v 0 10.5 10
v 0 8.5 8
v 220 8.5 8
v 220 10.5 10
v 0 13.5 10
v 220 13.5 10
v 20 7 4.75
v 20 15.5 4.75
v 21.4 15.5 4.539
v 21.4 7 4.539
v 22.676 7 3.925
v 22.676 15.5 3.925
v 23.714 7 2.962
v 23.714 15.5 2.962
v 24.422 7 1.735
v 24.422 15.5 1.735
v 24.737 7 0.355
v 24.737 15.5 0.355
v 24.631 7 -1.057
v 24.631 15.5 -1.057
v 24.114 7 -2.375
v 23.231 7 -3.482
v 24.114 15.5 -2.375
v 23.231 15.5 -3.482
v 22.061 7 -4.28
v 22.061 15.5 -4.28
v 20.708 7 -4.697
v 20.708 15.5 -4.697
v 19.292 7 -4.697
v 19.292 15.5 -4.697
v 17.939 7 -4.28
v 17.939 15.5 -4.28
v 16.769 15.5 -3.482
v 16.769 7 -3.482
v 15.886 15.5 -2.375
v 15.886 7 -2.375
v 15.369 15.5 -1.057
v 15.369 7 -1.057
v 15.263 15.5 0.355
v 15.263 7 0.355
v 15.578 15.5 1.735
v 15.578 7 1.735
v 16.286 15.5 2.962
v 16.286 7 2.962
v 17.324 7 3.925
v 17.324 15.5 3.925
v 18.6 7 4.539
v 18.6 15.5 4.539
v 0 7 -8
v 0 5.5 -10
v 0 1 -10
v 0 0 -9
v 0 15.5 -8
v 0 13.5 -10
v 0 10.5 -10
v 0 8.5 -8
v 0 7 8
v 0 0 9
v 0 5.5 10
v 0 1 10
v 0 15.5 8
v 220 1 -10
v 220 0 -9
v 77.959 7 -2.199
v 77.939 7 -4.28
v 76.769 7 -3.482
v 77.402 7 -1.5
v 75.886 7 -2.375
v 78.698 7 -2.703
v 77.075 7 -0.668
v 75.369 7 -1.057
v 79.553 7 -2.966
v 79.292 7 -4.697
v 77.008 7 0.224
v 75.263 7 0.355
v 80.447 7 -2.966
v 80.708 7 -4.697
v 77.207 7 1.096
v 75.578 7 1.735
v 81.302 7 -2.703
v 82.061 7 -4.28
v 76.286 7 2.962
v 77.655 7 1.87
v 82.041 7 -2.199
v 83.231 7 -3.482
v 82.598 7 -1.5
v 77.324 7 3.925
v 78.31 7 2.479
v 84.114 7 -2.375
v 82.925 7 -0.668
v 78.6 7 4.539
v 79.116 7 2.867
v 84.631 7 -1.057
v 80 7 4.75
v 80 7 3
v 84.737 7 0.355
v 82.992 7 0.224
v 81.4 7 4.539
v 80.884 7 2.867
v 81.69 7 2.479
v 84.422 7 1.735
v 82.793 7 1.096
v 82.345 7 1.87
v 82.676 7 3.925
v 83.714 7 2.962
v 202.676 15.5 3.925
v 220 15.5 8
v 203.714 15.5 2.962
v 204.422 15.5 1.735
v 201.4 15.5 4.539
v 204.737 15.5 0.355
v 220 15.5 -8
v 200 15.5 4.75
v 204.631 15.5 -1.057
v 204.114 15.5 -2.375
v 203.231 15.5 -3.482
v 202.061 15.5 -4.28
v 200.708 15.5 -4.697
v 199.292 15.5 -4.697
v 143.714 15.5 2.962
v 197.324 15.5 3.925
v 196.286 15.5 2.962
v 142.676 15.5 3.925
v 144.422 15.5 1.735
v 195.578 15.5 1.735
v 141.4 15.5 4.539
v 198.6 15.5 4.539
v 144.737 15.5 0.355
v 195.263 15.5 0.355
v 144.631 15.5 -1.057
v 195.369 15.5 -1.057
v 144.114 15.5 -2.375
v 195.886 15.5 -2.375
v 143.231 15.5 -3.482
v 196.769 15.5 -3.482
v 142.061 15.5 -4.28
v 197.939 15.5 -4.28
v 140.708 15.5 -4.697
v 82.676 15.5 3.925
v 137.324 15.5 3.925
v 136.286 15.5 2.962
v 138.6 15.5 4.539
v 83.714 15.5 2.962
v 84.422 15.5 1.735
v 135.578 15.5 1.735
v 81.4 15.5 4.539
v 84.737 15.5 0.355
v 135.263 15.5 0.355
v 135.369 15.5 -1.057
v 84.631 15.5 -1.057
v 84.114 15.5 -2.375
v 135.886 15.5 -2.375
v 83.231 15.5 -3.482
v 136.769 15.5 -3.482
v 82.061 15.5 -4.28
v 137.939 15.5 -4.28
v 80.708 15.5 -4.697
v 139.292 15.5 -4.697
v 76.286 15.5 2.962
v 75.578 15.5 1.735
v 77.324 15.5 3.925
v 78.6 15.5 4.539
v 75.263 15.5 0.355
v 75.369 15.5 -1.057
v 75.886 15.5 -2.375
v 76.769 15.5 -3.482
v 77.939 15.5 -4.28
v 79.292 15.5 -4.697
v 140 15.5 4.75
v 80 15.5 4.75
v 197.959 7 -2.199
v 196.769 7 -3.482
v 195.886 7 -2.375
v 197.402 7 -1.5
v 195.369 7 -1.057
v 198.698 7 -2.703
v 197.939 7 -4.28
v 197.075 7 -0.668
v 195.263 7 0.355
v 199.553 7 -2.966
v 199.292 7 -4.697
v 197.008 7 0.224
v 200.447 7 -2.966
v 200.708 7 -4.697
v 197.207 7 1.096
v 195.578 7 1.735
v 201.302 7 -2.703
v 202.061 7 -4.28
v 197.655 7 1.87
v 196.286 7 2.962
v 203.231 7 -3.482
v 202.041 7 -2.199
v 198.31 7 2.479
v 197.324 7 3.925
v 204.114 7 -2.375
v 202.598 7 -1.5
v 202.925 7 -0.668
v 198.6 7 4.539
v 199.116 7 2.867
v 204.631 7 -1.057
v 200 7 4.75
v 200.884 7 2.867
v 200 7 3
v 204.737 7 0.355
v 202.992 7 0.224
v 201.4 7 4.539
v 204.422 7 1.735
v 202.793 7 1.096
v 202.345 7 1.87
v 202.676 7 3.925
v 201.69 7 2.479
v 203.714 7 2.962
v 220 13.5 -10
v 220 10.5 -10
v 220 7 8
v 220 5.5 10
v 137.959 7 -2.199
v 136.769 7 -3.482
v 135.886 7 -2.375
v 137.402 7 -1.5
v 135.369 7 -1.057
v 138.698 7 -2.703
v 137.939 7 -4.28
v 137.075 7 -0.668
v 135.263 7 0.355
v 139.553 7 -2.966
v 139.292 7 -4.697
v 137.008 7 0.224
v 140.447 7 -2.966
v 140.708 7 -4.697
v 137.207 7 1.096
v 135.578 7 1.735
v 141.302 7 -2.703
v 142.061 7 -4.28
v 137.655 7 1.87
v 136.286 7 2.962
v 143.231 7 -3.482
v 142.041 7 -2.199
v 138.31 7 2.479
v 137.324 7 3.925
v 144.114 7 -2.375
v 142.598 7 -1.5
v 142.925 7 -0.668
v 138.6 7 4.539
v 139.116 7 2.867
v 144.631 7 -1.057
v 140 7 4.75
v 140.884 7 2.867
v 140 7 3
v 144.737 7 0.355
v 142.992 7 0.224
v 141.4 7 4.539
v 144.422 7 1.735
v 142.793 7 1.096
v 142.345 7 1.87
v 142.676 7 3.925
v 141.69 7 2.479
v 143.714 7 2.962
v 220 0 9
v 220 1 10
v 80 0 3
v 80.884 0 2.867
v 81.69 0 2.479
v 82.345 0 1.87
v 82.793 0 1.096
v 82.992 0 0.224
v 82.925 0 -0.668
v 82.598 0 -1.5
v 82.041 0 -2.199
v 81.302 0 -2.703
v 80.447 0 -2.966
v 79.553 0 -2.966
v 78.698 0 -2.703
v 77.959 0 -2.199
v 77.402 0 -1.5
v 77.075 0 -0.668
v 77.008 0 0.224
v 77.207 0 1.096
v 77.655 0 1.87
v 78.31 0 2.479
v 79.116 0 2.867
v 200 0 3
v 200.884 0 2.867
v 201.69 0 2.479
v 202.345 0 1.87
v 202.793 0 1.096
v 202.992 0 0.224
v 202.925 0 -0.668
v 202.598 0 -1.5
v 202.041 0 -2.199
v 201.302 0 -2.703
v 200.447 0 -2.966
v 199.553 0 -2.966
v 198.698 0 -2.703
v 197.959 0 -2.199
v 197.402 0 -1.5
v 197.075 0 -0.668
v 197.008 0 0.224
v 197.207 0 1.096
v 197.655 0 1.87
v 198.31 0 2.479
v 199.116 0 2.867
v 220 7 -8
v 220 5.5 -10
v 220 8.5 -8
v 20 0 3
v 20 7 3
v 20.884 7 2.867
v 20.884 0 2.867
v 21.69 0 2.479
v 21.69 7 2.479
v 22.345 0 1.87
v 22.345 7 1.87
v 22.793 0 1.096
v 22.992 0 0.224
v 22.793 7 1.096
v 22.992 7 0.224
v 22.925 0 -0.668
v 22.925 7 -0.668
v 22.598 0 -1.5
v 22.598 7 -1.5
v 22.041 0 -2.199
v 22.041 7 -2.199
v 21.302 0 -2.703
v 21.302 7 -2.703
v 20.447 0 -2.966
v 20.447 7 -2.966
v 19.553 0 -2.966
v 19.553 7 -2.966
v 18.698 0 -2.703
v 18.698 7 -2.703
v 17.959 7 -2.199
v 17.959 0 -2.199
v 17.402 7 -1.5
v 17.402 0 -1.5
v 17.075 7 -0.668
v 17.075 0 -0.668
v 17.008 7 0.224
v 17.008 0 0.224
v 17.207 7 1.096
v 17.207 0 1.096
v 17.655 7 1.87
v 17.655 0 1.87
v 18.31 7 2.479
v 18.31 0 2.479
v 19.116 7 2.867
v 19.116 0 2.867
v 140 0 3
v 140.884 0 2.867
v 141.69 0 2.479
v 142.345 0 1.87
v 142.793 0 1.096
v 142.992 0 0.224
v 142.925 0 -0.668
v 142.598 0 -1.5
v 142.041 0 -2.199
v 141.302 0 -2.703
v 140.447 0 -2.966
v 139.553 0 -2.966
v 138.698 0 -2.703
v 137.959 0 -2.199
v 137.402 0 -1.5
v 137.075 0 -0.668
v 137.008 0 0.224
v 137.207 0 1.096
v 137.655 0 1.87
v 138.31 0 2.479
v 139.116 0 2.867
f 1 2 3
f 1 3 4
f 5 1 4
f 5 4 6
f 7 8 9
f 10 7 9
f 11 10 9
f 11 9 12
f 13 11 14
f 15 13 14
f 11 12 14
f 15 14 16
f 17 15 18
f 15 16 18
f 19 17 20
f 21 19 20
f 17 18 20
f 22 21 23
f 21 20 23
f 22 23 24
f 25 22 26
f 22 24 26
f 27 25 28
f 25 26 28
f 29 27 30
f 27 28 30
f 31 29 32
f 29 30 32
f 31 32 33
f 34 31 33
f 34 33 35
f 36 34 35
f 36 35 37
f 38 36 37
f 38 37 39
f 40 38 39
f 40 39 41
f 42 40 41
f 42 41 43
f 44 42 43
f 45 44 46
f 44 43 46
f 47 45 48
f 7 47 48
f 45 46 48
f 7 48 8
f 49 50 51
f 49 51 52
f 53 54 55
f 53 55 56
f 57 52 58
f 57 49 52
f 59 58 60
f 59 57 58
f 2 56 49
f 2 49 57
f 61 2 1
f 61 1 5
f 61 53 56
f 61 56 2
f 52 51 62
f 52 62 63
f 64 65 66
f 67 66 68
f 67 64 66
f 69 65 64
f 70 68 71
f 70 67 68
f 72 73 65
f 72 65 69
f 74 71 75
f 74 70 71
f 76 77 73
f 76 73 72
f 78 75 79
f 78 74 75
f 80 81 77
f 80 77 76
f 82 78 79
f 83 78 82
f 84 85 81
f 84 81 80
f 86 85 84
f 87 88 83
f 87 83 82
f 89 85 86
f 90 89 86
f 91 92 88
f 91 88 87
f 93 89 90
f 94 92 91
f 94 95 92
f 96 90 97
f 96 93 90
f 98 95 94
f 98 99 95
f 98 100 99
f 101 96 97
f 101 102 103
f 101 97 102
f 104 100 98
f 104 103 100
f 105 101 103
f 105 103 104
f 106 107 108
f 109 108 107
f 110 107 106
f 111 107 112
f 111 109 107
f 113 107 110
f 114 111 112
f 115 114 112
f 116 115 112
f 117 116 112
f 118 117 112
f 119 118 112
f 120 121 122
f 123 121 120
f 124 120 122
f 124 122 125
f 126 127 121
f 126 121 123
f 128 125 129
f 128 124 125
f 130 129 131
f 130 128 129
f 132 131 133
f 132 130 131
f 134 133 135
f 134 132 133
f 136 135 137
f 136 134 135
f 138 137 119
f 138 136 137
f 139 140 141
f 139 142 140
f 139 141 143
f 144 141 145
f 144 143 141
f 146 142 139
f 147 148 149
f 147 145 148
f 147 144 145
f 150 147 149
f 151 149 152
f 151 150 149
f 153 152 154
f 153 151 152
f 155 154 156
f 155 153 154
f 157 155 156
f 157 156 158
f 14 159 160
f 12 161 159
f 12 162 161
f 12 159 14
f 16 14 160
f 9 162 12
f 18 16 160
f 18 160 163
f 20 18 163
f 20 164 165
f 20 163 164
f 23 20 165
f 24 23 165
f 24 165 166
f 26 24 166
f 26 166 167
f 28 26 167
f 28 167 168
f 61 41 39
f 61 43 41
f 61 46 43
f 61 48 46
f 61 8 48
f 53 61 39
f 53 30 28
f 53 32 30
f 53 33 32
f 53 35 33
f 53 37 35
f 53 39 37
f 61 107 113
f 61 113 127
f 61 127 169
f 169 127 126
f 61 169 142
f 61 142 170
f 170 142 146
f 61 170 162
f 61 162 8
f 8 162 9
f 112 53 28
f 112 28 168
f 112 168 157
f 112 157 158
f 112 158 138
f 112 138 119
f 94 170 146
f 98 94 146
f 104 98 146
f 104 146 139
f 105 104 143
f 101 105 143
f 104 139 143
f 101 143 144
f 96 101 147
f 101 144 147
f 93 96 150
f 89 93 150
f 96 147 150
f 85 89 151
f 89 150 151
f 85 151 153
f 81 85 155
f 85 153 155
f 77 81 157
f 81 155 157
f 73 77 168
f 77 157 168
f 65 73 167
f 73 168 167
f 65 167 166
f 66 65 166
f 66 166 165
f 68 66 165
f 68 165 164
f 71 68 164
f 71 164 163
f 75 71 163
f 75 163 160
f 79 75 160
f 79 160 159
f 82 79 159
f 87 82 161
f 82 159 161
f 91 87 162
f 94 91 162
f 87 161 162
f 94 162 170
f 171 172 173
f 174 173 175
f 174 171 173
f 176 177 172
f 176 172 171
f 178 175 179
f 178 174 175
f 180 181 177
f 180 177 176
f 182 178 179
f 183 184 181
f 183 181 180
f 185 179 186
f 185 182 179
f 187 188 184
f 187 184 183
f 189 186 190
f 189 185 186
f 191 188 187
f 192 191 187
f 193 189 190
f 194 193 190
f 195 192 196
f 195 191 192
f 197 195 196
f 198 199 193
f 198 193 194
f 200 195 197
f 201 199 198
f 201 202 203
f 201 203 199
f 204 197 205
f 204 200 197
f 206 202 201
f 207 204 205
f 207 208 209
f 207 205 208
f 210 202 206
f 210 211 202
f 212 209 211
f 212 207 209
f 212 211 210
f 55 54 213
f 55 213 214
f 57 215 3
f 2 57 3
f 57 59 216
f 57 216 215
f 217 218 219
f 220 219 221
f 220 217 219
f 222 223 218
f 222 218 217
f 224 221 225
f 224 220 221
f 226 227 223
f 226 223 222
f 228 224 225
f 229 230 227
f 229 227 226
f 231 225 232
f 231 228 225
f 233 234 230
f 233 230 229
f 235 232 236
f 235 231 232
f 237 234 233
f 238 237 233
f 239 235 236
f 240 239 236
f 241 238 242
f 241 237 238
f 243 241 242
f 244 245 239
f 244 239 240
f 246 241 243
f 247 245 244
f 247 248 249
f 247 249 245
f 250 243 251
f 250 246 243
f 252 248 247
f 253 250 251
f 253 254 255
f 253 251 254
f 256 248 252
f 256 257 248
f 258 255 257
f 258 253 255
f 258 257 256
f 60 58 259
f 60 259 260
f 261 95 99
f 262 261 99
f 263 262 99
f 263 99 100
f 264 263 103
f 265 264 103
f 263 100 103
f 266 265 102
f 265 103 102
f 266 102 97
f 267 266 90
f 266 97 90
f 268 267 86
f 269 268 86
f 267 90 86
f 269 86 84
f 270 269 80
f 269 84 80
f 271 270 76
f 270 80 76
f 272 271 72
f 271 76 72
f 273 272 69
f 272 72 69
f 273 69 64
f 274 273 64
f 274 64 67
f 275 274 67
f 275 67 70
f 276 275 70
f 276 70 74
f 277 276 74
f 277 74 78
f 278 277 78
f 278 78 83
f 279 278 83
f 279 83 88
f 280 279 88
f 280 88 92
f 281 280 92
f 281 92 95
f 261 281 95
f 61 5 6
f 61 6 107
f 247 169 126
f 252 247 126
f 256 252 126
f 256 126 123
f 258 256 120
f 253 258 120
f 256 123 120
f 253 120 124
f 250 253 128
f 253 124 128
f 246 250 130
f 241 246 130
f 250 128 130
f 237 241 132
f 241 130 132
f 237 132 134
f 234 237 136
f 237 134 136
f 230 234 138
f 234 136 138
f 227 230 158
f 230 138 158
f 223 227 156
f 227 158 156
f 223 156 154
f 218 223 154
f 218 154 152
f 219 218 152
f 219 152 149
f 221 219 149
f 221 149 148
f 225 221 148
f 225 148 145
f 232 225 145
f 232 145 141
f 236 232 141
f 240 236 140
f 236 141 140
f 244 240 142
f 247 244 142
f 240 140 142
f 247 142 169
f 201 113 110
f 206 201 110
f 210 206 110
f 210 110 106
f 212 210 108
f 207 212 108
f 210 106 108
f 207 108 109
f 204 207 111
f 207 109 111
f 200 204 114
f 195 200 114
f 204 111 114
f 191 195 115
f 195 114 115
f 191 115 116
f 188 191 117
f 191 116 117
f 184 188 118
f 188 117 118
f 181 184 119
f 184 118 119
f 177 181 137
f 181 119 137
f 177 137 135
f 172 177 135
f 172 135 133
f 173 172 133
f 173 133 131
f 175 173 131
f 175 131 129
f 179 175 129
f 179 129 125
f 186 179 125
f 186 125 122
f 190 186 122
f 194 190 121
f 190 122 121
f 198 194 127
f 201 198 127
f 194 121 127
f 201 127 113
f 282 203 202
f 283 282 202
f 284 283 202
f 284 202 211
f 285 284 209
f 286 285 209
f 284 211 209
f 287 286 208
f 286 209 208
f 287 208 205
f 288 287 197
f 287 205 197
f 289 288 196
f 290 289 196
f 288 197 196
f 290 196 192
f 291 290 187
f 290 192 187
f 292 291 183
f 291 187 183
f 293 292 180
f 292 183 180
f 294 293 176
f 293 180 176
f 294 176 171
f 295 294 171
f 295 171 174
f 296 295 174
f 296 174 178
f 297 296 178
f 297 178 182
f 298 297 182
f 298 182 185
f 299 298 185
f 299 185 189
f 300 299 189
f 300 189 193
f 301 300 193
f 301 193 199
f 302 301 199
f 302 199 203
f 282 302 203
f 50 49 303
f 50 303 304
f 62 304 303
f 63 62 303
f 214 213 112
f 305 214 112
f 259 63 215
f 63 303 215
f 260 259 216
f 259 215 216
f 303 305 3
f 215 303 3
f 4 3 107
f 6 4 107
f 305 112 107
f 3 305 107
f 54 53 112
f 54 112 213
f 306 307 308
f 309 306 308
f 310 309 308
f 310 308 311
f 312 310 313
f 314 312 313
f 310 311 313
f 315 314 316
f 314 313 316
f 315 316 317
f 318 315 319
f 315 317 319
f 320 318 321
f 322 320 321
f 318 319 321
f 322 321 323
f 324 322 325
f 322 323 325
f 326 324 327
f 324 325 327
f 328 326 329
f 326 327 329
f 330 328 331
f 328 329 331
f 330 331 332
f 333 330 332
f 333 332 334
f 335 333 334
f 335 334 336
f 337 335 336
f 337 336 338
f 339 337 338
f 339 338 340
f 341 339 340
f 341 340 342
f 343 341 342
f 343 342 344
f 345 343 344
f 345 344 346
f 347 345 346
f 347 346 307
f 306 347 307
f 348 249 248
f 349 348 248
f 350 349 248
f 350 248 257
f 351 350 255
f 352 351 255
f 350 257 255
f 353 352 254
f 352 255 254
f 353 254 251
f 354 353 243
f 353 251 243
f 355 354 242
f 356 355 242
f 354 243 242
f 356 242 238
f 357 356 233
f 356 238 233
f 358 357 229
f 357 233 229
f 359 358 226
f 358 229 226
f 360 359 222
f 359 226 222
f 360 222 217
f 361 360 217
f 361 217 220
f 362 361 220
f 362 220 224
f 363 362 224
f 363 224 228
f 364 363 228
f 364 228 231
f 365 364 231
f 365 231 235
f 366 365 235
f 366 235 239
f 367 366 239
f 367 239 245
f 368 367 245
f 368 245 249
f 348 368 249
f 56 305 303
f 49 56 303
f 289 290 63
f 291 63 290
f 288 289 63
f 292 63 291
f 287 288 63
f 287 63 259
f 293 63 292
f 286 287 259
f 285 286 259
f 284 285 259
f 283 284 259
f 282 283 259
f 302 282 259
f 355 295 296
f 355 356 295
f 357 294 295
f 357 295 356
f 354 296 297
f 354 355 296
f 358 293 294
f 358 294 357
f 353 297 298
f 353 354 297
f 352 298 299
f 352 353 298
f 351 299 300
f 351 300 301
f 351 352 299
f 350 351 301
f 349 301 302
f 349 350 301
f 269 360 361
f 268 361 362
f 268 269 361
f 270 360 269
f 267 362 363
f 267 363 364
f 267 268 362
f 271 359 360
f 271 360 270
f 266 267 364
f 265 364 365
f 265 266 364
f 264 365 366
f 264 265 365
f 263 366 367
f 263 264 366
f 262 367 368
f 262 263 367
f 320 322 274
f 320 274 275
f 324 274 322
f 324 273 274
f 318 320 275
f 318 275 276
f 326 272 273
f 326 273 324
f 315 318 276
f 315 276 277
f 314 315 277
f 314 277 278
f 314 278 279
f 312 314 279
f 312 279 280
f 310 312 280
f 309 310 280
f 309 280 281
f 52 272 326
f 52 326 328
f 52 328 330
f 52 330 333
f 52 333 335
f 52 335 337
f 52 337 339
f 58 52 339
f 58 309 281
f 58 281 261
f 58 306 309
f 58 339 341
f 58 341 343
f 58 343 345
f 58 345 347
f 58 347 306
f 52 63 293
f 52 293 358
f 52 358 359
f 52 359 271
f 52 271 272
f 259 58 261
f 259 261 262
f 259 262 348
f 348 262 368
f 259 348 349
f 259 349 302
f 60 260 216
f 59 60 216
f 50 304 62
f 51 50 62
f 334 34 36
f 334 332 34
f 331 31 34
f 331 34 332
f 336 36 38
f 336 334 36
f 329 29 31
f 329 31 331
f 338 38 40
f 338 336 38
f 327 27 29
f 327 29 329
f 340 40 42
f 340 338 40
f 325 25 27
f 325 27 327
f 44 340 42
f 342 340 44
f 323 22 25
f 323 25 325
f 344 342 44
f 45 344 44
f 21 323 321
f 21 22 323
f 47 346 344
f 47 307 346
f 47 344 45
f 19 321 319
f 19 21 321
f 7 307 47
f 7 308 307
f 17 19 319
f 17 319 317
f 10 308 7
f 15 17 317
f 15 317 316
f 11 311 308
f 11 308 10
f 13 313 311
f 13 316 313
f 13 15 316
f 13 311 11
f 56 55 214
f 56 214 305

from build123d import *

# Parameters (mm, degrees)
BOSS_EXTRUDE1_DEPTH = 220
SKETCH2_R           = 4.75
CUT_EXTRUDE1_DEPTH  = 8.5
SKETCH3_R           = 3
CUT_EXTRUDE2_DEPTH  = 221.391129586
LPATTERN1_COUNT     = 4
LPATTERN1_PITCH     = 60


with BuildPart() as part:
    # Sketch1 → Boss-Extrude1 (new body)
    with BuildSketch(Plane(origin=(0, 0, 0), x_dir=(0, 0, -1), z_dir=(1, 0, 0))):
        Polygon((9, 0), (-9, 0), (-10, 1), (-10, 5.5), (-8, 7), (-8, 8.5), (-10, 10.5), (-10, 13.5), (-8, 15.5), (8, 15.5), (10, 13.5), (10, 10.5), (8, 8.5), (8, 7), (10, 5.5), (10, 1), align=None)
    extrude(amount=BOSS_EXTRUDE1_DEPTH)

    # Sketch2 → Cut-Extrude1 (cut)
    with BuildSketch(Plane(origin=(0, 15.5, 0), x_dir=(1, 0, 0), z_dir=(0, 1, 0))):
        with Locations(Location((20, 0, 0), (0, 0, 270))):
            Circle(SKETCH2_R)
    cut_extrude1 = extrude(amount=-CUT_EXTRUDE1_DEPTH, mode=Mode.SUBTRACT)

    # Sketch3 → Cut-Extrude2 (cut, through all)
    with BuildSketch(Plane(origin=(0, 7, 0), x_dir=(1, 0, 0), z_dir=(0, 1, 0))):
        with Locations(Location((20, 0, 0), (0, 0, 270))):
            Circle(SKETCH3_R)
    cut_extrude2 = extrude(amount=-CUT_EXTRUDE2_DEPTH, mode=Mode.SUBTRACT)

    # LPattern1: Cut-Extrude1, Cut-Extrude2 ×4
    with Locations(*[(i * LPATTERN1_PITCH, 0, 0) for i in range(1, LPATTERN1_COUNT)]):
        add(cut_extrude1, mode=Mode.SUBTRACT)
        add(cut_extrude2, mode=Mode.SUBTRACT)


solid = part.part
